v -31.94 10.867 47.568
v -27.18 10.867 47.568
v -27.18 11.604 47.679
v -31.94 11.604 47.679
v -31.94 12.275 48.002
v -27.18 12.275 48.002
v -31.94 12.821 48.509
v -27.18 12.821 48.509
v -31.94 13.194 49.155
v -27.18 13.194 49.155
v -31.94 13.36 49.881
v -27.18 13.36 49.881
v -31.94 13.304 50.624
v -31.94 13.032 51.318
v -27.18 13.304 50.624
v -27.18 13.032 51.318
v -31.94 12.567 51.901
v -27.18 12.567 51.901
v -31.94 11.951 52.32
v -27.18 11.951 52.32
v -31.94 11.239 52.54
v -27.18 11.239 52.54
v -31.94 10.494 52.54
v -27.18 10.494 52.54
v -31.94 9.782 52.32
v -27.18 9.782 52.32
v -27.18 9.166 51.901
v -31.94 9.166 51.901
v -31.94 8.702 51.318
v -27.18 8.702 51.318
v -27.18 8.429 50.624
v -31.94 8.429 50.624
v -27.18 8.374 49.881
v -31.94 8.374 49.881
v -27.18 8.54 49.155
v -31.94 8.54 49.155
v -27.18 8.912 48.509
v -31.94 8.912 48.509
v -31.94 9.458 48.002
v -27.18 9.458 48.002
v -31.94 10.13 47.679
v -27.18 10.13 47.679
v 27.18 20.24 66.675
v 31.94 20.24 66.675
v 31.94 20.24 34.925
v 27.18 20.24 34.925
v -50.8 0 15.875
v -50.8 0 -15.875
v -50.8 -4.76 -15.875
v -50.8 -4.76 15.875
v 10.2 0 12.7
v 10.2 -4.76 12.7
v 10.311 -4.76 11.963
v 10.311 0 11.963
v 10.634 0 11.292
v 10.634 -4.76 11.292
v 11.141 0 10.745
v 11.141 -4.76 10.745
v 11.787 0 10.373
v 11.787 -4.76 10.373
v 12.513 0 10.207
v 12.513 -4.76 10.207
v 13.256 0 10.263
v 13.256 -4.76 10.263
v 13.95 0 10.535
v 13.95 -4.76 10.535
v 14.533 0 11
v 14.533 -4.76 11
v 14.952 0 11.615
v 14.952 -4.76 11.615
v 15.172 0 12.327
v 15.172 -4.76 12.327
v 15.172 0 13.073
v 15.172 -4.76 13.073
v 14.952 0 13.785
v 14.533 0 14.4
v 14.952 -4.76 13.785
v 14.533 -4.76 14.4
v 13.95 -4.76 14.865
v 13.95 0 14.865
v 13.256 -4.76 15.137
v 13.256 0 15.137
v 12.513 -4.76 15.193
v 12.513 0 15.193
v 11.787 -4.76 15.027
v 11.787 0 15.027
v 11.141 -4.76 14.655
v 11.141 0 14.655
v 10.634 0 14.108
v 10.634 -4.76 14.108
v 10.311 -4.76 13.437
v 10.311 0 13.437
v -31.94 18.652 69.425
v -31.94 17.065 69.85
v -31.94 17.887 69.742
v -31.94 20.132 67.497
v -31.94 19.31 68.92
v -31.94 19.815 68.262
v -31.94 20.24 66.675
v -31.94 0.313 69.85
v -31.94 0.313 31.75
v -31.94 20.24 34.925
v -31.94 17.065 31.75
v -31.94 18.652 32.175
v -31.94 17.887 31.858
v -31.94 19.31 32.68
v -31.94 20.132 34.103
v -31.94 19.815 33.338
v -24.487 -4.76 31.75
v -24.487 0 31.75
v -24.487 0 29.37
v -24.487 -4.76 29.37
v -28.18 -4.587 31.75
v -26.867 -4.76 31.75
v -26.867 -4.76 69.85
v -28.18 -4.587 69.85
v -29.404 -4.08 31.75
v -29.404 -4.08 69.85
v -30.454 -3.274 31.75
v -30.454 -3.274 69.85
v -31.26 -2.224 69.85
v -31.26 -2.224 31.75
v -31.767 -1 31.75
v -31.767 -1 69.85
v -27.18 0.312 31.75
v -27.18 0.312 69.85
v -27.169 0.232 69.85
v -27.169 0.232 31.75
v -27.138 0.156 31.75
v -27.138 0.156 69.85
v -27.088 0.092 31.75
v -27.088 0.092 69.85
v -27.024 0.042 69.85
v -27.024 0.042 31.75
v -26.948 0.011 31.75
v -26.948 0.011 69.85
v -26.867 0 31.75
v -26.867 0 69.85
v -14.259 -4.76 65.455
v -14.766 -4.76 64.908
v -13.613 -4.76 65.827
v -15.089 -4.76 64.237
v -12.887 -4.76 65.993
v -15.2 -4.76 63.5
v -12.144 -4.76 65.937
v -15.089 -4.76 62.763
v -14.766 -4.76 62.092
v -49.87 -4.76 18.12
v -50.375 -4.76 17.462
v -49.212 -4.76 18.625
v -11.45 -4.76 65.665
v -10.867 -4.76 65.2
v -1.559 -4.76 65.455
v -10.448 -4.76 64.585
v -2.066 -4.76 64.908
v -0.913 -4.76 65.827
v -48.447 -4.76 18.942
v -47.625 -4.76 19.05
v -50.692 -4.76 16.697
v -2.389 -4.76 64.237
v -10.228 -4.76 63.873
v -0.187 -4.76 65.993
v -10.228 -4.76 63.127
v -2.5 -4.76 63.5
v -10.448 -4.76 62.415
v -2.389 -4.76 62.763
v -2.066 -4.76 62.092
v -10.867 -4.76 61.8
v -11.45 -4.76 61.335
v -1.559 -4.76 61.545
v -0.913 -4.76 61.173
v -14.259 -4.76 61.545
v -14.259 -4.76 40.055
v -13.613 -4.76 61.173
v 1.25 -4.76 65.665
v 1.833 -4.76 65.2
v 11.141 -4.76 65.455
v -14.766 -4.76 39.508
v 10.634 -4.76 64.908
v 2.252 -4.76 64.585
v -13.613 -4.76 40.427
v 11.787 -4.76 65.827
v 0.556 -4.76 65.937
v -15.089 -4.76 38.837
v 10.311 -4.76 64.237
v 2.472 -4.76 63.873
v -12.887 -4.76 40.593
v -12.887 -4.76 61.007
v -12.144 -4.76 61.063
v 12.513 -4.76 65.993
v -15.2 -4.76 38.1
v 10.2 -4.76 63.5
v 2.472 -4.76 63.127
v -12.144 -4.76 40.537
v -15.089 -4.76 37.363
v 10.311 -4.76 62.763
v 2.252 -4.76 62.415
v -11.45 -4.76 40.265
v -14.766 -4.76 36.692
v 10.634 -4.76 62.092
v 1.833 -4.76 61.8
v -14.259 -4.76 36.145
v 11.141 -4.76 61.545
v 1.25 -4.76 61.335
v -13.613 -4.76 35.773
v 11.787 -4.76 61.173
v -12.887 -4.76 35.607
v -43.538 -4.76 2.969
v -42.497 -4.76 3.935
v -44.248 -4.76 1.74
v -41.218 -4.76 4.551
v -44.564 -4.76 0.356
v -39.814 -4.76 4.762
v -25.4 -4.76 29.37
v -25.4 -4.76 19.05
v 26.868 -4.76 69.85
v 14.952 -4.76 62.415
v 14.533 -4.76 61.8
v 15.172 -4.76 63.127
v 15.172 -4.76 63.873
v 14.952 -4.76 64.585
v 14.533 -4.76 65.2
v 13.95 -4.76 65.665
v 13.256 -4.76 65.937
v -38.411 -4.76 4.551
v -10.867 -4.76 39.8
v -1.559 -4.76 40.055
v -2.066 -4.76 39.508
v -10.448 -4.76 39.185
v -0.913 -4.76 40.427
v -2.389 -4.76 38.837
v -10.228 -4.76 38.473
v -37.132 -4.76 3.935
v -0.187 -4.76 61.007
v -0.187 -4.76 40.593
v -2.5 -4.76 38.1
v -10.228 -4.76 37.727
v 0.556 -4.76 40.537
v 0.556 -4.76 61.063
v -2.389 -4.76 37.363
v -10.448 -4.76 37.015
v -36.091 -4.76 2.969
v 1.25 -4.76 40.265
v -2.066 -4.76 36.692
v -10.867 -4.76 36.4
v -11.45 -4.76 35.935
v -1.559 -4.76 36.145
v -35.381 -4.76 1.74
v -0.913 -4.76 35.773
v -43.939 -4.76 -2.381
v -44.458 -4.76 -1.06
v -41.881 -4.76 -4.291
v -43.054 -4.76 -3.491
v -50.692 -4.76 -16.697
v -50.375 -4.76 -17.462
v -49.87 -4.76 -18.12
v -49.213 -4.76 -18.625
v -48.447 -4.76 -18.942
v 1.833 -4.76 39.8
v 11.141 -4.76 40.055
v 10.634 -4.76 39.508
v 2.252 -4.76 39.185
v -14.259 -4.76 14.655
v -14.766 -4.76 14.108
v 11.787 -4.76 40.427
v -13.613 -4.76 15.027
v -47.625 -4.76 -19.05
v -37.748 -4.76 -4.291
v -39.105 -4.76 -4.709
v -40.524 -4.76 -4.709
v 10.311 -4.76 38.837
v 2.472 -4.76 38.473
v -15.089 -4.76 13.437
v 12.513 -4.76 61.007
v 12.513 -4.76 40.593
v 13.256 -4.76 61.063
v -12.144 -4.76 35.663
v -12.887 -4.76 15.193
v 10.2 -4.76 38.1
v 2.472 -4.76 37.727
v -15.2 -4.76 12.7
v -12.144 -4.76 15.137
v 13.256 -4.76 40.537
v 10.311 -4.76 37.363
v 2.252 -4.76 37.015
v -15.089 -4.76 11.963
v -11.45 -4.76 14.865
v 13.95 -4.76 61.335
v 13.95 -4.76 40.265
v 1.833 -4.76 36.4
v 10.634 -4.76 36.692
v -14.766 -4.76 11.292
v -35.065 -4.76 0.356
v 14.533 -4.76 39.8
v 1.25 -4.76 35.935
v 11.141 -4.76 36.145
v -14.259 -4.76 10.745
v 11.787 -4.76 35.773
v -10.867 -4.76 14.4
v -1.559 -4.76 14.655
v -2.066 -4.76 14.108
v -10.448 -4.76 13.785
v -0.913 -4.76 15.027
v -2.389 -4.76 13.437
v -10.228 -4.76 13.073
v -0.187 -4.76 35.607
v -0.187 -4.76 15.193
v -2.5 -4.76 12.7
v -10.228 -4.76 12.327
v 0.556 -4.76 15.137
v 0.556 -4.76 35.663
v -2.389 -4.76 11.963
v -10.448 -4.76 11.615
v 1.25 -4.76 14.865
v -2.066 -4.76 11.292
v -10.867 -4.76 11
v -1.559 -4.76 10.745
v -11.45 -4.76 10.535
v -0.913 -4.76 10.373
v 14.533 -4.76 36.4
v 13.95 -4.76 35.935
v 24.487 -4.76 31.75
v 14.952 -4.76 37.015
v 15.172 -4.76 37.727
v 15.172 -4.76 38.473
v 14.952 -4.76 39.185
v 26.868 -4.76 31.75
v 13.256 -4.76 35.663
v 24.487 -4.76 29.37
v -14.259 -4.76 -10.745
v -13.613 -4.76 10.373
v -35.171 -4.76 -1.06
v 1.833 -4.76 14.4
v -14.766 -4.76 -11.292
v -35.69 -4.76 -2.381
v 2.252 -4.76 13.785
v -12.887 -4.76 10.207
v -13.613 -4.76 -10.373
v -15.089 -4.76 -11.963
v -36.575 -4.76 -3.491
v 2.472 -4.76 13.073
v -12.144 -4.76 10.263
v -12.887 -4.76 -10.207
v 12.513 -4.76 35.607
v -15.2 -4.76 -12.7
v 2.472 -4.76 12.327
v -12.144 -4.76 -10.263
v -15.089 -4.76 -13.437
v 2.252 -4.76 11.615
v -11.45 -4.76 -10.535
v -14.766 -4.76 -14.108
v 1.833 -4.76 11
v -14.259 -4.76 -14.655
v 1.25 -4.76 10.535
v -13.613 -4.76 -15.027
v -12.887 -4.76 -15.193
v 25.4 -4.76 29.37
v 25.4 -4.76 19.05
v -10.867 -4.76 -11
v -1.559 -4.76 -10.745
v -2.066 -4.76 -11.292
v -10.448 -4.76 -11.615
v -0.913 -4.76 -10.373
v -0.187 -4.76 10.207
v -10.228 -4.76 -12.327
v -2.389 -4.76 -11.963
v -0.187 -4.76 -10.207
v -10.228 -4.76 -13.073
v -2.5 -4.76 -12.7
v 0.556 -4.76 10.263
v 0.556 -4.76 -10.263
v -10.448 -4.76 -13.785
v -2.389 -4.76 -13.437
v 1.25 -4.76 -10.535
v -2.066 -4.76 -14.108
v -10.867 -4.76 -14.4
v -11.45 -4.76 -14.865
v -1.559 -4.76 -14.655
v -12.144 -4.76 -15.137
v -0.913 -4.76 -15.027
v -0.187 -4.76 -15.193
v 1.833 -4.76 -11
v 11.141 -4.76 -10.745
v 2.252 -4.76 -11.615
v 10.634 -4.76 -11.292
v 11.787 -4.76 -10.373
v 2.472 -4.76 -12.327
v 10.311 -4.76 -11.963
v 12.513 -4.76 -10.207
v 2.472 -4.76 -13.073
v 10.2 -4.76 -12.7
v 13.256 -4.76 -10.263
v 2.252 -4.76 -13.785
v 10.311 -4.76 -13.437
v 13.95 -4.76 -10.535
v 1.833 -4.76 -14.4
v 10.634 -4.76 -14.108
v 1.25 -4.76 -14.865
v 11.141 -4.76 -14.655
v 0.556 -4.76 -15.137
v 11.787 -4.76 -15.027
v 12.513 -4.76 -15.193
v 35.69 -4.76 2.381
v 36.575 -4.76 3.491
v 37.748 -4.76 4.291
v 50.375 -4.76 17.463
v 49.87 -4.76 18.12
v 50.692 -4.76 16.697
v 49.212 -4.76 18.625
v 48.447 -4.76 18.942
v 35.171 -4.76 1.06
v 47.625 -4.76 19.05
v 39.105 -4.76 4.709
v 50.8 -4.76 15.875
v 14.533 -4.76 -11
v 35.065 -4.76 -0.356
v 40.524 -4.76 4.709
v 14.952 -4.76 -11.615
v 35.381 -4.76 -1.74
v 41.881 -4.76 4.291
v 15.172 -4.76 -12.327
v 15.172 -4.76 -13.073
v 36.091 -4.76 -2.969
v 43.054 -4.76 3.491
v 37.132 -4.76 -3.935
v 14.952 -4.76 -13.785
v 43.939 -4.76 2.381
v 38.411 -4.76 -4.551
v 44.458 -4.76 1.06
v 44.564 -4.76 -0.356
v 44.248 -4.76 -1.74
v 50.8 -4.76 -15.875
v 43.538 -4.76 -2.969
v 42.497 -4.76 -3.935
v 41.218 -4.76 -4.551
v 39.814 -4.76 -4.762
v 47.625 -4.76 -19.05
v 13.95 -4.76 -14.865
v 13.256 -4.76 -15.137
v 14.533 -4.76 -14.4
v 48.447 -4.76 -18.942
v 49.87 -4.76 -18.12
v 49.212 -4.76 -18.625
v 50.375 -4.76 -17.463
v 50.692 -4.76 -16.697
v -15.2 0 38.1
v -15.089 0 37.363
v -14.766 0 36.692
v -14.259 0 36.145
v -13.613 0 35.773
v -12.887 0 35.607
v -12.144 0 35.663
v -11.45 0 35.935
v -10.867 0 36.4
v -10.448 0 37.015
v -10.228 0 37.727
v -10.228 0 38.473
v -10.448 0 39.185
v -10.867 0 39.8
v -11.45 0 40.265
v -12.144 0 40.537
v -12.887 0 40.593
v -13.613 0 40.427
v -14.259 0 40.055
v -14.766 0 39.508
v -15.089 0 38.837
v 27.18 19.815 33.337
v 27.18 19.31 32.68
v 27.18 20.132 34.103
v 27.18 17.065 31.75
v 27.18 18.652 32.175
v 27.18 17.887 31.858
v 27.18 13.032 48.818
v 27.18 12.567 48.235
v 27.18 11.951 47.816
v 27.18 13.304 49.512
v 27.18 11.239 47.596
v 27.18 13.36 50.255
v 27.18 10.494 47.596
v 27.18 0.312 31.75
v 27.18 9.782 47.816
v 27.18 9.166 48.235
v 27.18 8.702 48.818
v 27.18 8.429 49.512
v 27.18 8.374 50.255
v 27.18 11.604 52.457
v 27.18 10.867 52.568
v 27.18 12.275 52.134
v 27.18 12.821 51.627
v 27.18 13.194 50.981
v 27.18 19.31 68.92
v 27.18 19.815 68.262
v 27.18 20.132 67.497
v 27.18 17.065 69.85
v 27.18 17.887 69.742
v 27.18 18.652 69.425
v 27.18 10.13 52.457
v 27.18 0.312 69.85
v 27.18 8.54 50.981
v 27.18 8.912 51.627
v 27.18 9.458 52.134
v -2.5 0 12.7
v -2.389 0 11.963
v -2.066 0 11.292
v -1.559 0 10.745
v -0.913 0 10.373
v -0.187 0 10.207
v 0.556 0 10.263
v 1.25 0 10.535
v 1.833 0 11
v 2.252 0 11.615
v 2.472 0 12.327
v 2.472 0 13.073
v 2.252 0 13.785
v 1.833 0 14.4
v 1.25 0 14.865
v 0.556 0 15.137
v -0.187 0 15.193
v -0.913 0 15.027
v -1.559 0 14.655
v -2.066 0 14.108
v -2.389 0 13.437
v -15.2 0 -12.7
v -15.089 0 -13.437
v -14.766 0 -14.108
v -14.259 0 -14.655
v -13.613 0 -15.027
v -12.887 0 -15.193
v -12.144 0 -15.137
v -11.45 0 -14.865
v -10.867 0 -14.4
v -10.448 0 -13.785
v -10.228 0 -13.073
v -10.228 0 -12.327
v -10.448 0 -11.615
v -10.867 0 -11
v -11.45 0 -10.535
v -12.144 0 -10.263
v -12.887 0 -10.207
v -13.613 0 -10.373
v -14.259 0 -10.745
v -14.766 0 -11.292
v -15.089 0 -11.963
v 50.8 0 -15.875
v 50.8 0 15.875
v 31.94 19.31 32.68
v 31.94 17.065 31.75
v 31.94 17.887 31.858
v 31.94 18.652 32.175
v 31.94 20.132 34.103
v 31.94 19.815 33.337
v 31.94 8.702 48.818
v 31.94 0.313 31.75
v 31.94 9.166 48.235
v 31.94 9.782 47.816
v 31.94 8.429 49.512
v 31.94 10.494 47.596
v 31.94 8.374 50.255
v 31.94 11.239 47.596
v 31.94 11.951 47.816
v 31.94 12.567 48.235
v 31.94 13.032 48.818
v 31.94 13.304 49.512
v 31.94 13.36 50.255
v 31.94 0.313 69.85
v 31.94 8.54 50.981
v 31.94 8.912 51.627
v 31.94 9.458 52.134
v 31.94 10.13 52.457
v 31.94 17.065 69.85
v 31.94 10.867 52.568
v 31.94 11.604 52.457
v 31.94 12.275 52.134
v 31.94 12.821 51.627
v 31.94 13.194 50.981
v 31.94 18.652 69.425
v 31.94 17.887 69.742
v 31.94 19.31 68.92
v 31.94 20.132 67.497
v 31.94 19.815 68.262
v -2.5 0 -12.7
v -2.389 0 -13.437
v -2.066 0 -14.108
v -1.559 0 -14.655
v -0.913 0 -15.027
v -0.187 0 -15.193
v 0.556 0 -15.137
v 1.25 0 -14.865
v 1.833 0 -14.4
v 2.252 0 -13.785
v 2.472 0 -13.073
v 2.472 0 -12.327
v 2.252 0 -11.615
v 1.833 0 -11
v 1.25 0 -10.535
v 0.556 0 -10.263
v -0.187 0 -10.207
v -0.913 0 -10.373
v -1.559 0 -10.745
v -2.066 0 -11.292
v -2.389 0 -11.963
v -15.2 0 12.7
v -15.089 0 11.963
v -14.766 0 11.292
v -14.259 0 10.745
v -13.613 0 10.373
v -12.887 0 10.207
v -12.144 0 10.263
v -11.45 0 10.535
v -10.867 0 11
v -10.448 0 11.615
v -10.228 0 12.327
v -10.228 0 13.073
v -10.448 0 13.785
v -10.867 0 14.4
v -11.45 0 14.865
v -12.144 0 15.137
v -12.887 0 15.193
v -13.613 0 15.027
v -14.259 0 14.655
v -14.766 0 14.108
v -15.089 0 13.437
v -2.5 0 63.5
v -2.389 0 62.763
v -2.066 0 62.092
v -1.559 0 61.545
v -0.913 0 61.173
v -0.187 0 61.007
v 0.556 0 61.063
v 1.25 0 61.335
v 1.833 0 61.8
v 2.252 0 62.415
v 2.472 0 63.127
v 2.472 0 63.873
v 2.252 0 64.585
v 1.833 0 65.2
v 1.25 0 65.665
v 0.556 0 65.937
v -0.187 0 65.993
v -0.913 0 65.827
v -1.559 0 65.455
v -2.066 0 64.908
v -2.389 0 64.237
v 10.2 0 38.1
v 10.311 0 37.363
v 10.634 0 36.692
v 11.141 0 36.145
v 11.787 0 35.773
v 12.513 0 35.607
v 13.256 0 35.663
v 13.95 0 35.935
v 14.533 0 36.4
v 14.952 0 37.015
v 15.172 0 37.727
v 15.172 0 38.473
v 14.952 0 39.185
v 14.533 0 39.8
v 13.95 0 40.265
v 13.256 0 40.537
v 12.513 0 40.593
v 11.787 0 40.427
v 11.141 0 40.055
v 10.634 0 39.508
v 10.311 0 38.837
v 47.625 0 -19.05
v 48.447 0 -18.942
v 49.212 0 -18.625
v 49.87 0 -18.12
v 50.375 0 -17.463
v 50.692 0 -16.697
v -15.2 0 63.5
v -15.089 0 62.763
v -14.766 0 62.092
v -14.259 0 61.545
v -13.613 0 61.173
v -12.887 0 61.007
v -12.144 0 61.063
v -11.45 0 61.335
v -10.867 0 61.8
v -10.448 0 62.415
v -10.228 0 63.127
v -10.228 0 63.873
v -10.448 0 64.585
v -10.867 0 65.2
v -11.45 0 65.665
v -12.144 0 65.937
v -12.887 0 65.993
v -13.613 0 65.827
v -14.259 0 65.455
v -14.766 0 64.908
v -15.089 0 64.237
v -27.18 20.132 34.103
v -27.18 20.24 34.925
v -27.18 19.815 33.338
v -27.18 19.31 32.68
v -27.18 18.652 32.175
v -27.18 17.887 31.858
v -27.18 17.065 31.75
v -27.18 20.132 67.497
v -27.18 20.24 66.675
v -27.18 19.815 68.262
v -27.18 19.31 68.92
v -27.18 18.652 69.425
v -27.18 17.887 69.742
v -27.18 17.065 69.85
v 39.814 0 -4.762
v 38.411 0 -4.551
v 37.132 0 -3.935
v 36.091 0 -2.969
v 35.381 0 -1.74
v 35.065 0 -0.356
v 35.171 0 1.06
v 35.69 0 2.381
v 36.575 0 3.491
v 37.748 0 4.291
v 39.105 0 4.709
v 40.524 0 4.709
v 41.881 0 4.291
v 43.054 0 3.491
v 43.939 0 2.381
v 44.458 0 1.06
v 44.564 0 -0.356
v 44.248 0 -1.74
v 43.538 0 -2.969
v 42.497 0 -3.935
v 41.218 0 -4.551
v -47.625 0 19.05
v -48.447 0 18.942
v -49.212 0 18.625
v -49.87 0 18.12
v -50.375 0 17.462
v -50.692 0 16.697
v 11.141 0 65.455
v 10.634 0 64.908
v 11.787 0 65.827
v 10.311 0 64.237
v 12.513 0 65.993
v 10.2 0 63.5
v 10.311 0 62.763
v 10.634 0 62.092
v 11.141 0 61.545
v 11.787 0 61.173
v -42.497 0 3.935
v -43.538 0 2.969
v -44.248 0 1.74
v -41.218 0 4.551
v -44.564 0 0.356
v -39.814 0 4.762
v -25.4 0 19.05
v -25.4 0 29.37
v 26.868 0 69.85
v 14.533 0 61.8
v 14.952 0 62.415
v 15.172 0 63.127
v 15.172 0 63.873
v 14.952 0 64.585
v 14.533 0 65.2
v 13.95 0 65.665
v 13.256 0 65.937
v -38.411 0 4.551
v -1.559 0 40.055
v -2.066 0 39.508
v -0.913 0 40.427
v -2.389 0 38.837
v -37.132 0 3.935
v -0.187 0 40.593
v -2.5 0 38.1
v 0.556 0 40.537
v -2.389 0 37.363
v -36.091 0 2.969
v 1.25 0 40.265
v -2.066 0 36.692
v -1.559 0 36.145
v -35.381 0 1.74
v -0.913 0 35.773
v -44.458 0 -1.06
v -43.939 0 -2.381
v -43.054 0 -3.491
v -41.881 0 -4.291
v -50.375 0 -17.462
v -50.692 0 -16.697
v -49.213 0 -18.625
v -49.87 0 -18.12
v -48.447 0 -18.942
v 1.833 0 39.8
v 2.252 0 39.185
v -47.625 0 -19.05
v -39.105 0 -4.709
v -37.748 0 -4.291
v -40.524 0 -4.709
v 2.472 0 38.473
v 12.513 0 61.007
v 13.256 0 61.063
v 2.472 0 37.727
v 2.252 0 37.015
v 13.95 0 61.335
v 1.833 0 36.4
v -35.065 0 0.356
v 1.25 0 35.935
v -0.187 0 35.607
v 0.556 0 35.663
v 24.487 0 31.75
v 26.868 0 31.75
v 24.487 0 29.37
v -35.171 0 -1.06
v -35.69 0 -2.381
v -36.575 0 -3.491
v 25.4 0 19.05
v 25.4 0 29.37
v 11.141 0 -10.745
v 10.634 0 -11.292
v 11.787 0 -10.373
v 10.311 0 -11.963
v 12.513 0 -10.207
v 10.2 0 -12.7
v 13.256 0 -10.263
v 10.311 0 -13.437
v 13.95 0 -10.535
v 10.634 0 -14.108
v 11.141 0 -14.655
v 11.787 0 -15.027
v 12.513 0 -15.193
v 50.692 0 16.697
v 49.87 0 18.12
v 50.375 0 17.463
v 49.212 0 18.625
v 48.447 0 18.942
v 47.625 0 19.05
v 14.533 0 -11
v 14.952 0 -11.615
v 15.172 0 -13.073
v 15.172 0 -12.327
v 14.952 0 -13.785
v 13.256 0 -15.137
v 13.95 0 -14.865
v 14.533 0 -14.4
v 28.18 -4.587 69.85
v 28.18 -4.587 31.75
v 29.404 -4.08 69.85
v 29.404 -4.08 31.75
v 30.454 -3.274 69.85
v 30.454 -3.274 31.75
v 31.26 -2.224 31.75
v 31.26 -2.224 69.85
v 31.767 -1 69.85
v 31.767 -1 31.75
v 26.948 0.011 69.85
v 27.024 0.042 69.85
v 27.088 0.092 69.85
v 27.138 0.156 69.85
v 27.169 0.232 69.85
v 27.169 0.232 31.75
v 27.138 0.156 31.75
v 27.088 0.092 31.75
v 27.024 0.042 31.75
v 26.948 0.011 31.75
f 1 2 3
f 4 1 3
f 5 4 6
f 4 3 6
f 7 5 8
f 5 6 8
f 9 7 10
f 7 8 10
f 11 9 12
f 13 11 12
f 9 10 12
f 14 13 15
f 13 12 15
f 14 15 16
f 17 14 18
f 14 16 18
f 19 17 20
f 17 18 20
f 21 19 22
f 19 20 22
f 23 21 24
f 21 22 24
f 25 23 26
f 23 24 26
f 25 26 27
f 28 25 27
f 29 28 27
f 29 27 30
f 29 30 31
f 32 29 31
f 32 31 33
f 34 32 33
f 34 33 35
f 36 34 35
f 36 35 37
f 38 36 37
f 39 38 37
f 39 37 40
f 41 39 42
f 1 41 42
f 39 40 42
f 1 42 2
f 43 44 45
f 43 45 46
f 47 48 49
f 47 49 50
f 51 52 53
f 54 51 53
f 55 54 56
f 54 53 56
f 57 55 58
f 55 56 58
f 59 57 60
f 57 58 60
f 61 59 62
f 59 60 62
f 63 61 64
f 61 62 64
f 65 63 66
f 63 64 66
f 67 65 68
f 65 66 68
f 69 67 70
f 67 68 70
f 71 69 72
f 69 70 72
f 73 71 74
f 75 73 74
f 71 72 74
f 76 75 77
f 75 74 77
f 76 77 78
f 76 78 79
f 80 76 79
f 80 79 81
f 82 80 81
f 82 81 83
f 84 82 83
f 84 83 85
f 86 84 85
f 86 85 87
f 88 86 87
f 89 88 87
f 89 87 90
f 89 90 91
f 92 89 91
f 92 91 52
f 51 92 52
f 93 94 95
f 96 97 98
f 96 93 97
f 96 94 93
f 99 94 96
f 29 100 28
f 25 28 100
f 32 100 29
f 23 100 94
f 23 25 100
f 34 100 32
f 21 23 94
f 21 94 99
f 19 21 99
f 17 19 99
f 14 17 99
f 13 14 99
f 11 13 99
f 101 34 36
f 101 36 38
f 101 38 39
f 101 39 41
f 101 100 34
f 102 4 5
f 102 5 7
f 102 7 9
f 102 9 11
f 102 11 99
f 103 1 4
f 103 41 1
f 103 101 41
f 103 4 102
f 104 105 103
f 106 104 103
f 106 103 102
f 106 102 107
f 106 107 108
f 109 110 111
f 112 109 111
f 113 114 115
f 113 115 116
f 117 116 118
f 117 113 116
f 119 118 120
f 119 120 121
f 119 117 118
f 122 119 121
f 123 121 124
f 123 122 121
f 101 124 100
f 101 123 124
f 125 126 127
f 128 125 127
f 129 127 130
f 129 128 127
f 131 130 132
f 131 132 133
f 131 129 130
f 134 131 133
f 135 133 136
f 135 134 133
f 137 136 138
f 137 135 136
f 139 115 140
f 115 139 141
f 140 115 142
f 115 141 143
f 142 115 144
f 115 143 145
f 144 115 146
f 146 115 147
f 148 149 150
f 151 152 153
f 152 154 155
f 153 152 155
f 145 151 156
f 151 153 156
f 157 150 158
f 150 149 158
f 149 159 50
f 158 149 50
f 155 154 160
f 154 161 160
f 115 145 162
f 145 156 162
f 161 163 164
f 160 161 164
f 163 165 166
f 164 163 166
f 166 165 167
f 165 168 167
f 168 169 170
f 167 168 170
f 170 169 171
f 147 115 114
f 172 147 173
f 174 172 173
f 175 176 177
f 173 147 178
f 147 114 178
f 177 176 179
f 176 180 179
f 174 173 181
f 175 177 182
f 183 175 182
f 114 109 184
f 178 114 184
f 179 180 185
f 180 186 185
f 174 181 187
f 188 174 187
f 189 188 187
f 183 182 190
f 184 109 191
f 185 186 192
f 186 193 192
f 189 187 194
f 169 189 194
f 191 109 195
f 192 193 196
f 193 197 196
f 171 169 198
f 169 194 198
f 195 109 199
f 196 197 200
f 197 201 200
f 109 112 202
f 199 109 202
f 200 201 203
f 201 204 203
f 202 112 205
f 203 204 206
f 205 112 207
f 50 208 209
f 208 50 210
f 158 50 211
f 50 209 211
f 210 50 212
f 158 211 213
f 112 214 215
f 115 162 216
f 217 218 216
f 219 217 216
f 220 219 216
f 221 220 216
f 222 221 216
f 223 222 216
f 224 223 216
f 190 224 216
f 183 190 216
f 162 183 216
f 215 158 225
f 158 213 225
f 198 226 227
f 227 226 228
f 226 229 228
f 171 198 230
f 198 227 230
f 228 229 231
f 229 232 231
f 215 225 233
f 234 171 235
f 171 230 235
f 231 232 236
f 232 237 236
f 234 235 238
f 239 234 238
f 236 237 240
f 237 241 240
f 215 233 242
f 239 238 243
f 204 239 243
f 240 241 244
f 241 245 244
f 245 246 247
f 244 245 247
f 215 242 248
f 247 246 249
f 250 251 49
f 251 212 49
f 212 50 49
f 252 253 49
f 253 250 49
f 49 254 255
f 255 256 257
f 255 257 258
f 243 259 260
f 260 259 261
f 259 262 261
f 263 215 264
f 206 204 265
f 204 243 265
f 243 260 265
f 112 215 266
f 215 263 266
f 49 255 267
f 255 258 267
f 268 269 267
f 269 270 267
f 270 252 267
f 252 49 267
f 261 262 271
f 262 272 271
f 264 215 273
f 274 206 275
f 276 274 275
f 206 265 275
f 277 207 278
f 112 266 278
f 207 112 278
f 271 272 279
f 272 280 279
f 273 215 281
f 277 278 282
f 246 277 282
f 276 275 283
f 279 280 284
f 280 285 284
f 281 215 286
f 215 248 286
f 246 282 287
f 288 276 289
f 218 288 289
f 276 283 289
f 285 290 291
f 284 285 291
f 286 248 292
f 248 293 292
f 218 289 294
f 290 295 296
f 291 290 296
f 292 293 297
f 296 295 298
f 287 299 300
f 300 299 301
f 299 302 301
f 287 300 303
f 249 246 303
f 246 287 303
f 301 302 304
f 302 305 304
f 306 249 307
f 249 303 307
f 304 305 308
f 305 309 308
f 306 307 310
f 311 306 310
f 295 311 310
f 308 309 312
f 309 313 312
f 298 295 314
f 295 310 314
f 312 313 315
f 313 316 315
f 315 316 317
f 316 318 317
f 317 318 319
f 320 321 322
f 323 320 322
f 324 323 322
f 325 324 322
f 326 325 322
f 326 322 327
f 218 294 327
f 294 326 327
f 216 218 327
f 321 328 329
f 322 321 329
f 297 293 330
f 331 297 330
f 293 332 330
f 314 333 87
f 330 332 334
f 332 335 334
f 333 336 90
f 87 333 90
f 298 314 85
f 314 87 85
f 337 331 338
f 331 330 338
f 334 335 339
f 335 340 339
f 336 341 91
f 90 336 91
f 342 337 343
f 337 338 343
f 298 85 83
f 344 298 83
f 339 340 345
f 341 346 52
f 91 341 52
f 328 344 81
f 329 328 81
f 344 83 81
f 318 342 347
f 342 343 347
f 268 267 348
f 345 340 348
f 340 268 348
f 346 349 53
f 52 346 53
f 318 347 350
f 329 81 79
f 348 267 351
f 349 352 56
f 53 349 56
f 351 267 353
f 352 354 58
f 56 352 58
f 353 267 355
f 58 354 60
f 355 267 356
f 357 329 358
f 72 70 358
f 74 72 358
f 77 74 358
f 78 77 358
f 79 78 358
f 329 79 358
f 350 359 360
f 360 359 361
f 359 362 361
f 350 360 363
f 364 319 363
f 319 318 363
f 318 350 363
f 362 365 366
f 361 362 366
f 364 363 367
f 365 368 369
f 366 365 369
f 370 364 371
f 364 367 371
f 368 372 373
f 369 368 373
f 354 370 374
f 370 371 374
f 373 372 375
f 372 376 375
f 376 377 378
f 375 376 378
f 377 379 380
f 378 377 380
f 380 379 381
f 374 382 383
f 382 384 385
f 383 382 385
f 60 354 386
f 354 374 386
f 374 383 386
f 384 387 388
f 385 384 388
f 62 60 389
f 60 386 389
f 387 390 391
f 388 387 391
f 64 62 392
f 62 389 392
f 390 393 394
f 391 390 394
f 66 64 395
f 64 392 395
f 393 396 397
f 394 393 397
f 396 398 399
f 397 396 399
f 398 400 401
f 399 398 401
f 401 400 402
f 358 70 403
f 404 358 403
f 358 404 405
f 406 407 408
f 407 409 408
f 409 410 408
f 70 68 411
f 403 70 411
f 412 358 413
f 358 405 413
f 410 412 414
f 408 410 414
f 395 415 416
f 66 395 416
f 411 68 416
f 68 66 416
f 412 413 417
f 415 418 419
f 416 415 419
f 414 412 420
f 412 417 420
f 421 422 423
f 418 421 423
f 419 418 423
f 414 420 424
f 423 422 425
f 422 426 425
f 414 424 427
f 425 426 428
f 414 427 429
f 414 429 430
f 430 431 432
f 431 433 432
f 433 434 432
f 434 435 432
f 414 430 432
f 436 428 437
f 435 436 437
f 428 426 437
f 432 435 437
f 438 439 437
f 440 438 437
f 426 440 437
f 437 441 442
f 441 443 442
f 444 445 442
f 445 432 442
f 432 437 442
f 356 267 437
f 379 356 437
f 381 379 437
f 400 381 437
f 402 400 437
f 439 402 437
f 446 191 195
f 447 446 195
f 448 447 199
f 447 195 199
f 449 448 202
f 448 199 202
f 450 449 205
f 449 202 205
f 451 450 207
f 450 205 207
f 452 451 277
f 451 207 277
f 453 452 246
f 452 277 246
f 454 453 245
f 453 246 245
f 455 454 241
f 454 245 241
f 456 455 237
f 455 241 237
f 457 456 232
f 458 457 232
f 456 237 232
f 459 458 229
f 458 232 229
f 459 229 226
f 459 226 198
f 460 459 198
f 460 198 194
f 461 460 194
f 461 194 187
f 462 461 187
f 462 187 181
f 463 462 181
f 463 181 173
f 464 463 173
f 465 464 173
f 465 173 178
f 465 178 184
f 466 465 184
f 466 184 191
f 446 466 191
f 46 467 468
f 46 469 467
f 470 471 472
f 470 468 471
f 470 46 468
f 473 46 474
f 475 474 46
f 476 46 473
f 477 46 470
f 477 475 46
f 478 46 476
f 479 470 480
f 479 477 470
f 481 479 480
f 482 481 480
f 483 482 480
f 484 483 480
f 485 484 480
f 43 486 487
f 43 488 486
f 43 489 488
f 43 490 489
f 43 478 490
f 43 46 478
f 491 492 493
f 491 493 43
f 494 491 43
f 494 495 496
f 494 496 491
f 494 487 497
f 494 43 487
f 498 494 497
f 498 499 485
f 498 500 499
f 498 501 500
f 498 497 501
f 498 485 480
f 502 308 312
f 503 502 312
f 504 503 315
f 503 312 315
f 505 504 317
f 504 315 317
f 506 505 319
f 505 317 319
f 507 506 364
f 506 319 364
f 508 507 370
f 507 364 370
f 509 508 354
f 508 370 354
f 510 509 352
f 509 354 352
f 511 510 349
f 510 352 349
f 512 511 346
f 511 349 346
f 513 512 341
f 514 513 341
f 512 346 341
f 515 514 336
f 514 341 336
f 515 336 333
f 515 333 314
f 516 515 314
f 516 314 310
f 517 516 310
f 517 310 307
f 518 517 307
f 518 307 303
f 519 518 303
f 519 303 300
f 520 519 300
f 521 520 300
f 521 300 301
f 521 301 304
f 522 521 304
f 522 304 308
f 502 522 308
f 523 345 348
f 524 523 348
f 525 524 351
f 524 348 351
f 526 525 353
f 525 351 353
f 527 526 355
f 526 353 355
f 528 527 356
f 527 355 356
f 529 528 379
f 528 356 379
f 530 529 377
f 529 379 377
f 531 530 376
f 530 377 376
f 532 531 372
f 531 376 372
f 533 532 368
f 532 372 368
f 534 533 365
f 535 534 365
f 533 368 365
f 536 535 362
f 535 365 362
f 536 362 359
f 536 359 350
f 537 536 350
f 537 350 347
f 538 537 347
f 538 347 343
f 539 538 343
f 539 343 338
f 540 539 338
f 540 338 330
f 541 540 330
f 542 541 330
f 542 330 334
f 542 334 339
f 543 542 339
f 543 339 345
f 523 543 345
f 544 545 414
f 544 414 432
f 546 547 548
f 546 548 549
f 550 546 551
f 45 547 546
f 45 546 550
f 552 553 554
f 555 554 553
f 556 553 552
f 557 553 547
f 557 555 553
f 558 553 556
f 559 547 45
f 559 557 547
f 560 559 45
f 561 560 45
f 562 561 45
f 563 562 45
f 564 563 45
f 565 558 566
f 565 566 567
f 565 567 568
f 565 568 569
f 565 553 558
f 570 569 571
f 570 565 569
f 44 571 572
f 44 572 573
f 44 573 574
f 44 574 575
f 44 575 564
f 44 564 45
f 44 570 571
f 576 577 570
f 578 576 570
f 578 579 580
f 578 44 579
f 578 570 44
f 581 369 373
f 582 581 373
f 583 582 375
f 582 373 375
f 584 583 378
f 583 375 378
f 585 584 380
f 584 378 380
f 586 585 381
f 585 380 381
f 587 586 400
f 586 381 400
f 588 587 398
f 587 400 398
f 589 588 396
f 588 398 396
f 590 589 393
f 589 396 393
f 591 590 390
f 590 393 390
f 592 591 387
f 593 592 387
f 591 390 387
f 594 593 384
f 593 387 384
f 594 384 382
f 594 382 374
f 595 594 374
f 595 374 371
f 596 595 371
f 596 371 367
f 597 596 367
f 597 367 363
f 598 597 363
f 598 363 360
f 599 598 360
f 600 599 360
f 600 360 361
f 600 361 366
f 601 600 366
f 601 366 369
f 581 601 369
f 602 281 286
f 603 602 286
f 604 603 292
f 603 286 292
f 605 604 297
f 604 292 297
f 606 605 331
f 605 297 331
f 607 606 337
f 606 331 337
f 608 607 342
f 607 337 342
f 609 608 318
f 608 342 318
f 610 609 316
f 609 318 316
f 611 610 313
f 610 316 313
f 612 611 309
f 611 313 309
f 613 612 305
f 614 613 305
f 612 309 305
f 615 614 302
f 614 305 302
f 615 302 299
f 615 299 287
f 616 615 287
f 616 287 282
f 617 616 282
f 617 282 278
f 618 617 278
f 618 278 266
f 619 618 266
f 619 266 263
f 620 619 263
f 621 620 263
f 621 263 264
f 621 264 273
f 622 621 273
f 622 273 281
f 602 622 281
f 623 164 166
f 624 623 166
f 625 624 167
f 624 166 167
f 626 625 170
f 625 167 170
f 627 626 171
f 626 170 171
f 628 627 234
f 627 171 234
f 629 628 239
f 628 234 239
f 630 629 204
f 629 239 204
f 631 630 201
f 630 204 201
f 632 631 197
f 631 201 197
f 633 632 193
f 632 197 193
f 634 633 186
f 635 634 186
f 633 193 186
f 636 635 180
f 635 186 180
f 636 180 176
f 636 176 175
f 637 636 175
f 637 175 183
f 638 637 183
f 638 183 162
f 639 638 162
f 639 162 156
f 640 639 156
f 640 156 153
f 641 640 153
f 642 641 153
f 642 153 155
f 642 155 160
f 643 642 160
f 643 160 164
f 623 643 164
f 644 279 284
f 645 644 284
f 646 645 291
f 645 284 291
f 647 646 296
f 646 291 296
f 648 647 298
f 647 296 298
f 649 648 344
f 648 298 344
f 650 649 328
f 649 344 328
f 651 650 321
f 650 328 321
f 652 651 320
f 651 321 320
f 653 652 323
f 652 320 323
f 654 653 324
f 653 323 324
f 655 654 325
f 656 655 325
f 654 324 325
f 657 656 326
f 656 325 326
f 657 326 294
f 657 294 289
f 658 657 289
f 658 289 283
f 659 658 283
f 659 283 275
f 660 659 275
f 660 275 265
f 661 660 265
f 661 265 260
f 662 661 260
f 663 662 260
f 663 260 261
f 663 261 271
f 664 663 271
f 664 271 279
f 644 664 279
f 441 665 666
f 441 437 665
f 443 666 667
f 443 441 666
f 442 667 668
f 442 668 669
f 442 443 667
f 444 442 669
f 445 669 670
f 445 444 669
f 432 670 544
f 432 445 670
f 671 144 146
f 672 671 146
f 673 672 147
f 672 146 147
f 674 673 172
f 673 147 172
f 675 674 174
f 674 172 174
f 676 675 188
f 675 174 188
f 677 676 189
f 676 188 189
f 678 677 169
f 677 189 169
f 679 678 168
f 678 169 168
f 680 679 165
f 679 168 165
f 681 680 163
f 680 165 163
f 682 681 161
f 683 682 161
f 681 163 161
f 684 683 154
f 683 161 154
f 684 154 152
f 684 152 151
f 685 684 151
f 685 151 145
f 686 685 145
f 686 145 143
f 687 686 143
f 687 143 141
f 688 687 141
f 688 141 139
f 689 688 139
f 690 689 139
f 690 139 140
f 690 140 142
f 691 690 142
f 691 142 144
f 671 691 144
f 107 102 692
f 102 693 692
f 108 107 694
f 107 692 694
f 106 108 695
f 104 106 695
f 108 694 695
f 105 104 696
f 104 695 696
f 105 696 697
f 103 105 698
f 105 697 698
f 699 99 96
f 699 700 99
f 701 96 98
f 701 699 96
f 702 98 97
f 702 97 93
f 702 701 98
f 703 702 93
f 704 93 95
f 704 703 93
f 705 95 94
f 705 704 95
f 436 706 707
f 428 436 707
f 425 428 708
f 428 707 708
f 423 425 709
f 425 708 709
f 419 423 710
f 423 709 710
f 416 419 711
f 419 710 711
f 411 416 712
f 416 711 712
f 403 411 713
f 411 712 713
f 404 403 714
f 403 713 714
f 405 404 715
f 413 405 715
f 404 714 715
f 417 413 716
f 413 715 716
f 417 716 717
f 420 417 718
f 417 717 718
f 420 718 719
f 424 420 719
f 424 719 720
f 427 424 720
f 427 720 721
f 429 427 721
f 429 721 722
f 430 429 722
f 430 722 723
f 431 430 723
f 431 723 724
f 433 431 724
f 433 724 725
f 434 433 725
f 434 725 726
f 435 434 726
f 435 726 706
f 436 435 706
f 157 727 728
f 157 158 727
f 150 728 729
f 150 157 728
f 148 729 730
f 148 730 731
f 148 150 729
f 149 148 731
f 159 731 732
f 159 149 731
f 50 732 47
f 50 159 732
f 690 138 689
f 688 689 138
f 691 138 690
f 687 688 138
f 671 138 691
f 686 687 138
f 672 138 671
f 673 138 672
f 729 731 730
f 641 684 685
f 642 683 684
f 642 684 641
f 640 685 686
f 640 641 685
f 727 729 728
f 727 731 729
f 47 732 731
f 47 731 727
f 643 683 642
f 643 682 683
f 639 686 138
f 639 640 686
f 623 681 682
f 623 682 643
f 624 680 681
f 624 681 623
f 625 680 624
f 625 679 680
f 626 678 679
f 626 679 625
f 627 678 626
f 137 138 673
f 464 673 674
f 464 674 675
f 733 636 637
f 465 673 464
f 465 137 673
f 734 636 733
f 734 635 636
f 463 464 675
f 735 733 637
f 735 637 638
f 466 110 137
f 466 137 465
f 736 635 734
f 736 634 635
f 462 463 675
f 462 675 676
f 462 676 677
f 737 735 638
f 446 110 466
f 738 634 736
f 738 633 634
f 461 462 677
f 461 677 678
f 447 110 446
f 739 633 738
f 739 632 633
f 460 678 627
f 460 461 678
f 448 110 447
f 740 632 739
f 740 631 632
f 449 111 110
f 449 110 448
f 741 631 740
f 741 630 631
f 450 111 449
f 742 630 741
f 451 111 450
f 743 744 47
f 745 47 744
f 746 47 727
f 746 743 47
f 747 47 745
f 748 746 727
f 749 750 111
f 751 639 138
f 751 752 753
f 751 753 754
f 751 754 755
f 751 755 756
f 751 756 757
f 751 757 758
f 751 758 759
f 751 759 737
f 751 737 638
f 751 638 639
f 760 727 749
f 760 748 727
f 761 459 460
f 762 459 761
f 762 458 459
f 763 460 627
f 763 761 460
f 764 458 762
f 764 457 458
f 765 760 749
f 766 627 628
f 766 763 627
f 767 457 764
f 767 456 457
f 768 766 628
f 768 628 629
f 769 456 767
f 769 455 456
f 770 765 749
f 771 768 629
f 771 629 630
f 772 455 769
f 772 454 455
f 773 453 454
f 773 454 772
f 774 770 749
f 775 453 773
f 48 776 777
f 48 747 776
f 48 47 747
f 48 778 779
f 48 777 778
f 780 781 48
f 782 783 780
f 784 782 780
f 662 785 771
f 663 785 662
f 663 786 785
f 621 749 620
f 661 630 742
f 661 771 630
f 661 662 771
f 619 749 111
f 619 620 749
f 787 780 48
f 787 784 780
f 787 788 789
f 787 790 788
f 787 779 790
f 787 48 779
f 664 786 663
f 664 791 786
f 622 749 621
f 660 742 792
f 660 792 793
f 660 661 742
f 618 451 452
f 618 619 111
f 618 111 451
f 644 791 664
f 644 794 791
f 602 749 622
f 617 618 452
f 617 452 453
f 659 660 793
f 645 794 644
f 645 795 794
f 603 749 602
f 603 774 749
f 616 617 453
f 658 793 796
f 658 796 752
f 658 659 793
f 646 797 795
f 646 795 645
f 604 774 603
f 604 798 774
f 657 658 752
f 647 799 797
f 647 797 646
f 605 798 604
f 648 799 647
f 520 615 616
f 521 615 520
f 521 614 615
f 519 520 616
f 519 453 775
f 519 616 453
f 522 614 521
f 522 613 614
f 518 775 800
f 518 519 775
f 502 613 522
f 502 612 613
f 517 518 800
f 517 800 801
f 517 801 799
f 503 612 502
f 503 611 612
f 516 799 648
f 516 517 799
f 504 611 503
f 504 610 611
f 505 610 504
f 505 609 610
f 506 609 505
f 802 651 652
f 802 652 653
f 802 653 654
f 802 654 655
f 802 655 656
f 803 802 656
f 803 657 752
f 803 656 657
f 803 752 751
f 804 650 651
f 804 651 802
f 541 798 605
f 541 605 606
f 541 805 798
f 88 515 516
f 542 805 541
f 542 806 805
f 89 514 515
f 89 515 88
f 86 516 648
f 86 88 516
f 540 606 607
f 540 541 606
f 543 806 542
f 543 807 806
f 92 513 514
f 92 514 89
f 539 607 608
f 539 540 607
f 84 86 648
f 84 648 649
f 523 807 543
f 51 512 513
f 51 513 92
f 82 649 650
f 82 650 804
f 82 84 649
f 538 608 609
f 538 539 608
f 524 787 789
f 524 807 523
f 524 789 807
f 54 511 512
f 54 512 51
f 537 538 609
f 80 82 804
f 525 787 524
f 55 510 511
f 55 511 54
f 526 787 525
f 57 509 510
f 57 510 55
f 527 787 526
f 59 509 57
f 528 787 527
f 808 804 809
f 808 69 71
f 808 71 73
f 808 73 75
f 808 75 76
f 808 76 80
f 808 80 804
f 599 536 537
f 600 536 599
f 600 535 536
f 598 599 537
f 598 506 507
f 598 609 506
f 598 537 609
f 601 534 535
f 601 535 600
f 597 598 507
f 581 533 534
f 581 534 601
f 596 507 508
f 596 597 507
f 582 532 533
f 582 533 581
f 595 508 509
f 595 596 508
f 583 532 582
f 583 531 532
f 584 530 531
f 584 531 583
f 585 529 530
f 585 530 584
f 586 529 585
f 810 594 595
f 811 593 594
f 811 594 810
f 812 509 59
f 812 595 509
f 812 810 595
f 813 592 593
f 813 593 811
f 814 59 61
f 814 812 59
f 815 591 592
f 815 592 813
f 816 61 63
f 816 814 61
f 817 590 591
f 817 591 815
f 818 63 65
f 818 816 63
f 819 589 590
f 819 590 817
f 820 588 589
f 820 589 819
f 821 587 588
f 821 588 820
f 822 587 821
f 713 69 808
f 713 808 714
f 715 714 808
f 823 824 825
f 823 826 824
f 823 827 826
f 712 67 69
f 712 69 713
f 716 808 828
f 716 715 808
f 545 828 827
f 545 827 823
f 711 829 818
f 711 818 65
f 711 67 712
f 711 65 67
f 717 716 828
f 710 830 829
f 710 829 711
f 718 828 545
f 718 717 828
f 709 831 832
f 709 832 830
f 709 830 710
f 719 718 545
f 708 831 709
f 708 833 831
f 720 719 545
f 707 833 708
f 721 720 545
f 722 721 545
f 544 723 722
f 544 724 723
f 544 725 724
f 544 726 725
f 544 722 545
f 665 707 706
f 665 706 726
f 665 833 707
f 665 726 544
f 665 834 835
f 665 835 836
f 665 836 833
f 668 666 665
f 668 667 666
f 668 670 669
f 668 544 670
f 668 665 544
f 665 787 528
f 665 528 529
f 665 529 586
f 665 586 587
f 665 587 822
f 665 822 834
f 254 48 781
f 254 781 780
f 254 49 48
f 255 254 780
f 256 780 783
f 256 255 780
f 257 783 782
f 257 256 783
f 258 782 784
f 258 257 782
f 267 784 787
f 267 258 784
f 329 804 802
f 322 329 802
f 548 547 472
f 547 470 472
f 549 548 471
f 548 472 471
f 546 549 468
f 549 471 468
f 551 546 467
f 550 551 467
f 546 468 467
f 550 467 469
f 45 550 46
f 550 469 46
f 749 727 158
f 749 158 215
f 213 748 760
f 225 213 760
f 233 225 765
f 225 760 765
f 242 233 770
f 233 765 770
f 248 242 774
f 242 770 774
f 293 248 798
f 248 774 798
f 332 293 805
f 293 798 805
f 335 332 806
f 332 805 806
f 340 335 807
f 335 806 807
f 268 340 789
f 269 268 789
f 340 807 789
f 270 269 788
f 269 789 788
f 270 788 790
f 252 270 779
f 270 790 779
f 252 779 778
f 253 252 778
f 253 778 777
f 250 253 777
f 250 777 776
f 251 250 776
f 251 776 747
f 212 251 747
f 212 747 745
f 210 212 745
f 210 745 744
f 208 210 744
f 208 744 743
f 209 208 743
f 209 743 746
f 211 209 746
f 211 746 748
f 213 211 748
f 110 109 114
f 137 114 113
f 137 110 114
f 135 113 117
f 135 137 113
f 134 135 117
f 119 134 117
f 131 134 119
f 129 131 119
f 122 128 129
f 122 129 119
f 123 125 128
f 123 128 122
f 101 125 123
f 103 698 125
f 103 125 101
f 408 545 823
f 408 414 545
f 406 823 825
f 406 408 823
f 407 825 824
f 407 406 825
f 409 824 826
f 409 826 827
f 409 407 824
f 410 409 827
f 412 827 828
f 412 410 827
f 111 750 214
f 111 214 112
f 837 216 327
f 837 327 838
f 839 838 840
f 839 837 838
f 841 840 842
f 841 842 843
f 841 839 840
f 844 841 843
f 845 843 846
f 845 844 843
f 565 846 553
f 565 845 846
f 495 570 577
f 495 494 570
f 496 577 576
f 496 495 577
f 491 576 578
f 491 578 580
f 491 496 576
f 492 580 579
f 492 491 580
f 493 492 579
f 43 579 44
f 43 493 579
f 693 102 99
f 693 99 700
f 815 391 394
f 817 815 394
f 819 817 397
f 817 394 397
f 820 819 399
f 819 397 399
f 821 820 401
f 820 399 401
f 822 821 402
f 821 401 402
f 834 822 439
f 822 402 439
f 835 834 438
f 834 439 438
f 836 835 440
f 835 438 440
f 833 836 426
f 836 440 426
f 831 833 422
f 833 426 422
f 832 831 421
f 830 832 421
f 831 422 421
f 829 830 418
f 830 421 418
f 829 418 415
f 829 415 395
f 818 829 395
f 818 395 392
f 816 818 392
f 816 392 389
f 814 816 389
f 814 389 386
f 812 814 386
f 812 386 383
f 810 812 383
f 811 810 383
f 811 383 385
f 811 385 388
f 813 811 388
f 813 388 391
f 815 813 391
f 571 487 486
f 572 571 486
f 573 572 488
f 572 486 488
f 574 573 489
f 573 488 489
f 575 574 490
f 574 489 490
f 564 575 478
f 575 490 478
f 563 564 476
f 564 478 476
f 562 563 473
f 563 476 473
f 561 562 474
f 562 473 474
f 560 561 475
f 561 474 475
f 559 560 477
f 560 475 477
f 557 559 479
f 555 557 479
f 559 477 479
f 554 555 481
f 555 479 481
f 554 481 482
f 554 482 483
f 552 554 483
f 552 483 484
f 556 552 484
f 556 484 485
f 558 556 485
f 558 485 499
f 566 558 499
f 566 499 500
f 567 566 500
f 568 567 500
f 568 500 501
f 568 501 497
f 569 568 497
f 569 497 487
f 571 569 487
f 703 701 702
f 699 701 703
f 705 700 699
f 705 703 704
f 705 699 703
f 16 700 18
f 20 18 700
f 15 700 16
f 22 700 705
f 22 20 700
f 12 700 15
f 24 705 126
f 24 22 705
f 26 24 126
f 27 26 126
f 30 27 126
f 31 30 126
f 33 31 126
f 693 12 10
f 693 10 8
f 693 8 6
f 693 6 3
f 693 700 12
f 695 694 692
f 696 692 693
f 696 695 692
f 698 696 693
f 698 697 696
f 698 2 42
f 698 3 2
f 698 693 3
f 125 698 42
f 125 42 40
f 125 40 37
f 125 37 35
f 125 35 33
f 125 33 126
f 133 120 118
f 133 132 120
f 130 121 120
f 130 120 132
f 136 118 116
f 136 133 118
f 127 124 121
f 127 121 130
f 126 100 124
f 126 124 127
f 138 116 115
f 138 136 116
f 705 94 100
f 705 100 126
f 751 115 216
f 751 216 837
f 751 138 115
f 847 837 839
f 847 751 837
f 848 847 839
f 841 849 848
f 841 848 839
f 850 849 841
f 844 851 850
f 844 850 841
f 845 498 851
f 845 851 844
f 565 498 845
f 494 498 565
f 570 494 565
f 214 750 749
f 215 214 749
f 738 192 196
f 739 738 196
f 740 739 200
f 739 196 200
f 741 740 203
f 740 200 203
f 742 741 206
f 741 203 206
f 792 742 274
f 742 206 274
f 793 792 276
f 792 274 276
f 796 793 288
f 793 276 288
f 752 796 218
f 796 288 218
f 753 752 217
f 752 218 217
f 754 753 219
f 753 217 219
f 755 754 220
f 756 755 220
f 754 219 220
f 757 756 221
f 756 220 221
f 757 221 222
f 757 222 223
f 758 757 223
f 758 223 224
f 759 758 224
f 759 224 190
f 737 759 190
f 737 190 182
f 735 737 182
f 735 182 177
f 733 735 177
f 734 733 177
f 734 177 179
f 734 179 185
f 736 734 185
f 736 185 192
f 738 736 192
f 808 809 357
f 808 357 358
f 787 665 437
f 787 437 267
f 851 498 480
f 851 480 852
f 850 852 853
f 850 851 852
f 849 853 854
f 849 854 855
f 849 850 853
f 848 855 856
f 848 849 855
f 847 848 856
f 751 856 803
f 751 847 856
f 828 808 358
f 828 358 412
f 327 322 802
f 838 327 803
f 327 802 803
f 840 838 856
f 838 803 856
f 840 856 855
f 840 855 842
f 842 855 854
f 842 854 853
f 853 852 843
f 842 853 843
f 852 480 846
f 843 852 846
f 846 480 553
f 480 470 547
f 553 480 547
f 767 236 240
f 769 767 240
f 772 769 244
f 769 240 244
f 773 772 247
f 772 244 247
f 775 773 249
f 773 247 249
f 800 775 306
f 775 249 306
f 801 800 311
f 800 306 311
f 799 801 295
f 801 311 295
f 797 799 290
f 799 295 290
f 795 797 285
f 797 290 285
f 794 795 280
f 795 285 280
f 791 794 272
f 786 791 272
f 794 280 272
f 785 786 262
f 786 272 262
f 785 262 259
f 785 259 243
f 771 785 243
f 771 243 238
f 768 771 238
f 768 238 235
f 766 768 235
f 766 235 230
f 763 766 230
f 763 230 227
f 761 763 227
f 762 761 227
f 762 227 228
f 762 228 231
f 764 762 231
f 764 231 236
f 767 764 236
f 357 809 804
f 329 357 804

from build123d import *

# Parameters (mm, degrees)
T_LE_DE_BASE_PLI_E1_DEPTH                = 4.76
T_LE_PLI_E_SUR_AR_TE1_STRIP_W            = 19.665
T_LE_PLI_E_SUR_AR_TE1_STRIP_H            = 4.76
T_LE_PLI_E_SUR_AR_TE1_STRIP_CUT_DEPTH    = 38.1
T_LE_PLI_E_SUR_AR_TE1_RELIEF_W           = 22.045
T_LE_PLI_E_SUR_AR_TE1_RELIEF_H           = 2.38
T_LE_PLI_E_SUR_AR_TE1_RELIEF_CUT_DEPTH   = 4.76
T_LE_PLI_E_SUR_AR_TE1_STRIP_2_W          = 19.665
T_LE_PLI_E_SUR_AR_TE1_STRIP_2_H          = 4.76
T_LE_PLI_E_SUR_AR_TE1_STRIP_CUT_2_DEPTH  = 38.1
T_LE_PLI_E_SUR_AR_TE1_RELIEF_2_W         = 22.045
T_LE_PLI_E_SUR_AR_TE1_RELIEF_2_H         = 2.38
T_LE_PLI_E_SUR_AR_TE1_RELIEF_CUT_2_DEPTH = 4.76
T_LE_PLI_E_SUR_AR_TE1_DEPTH              = 38.1
T_LE_PLI_E_SUR_AR_TE1_BEND_DEPTH         = 38.1
ENL_V_MAT_EXTRU_1_REACH                  = 90.709
ESQUISSE12_W                             = 6.54
ESQUISSE12_H                             = 10.32
CONG_1_R                                 = 3.175
ESQUISSE13_R                             = 4.7625
ENL_V_MAT_EXTRU_3_DEPTH                  = 89.709188363
DIAM_TRE_DU_PER_AGE_5_0_5_1_D            = 5
R_P_TITION_LIN_AIRE1_COUNT               = 4
R_P_TITION_LIN_AIRE1_PITCH               = 25.4
DIAM_TRE_DU_PER_AGE_5_0_5_2_D            = 5
DIAM_TRE_DU_PER_AGE_5_0_5_2_DEPTH        = 4.76
DIAM_TRE_DU_PER_AGE_5_0_5_3_D            = 5


# Sheet-metal steps are written as plain solids
with BuildPart() as part:
    # Esquisse1 → Tôle de base pliée1 (new body)
    with BuildSketch(Plane(origin=(0, 0, 0), x_dir=(1, 0, 0), z_dir=(0, 1, 0))):
        Polygon((-31.94, -19.05), (-31.94, -69.85), (31.94, -69.85), (31.94, -19.05), (50.8, -19.05), (50.8, 19.05), (-50.8, 19.05), (-50.8, -19.05), align=None)
    extrude(amount=-T_LE_DE_BASE_PLI_E1_DEPTH)

    # Tôle pliée sur arête1 strip (across the edge) → Tôle pliée sur arête1 strip cut (cut)
    with BuildSketch(Plane(origin=(-31.94, 0, 31.75), x_dir=(1, 0, 0), z_dir=(0, 0, 1))):
        with Locations((-4.76, -2.38)):
            Rectangle(T_LE_PLI_E_SUR_AR_TE1_STRIP_W, T_LE_PLI_E_SUR_AR_TE1_STRIP_H)
    extrude(amount=T_LE_PLI_E_SUR_AR_TE1_STRIP_CUT_DEPTH, mode=Mode.SUBTRACT)

    # Tôle pliée sur arête1 relief (on the sheet) → Tôle pliée sur arête1 relief cut (cut)
    with BuildSketch(Plane(origin=(-26.8675, 0, 31.75), x_dir=(1, 0, 0), z_dir=(0, 1, 0))):
        with Locations((-8.6425, 1.19)):
            Rectangle(T_LE_PLI_E_SUR_AR_TE1_RELIEF_W, T_LE_PLI_E_SUR_AR_TE1_RELIEF_H)
    extrude(amount=-T_LE_PLI_E_SUR_AR_TE1_RELIEF_CUT_DEPTH, mode=Mode.SUBTRACT)

    # Tôle pliée sur arête1 strip 2 (across the edge) → Tôle pliée sur arête1 strip cut 2 (cut)
    with BuildSketch(Plane(origin=(31.94, 0, 69.85), x_dir=(-1, 0, 0), z_dir=(0, 0, -1))):
        with Locations((-4.76, -2.38)):
            Rectangle(T_LE_PLI_E_SUR_AR_TE1_STRIP_2_W, T_LE_PLI_E_SUR_AR_TE1_STRIP_2_H)
    extrude(amount=T_LE_PLI_E_SUR_AR_TE1_STRIP_CUT_2_DEPTH, mode=Mode.SUBTRACT)

    # Tôle pliée sur arête1 relief 2 (on the sheet) → Tôle pliée sur arête1 relief cut 2 (cut)
    with BuildSketch(Plane(origin=(26.8675, 0, 69.85), x_dir=(-1, 0, 0), z_dir=(0, 1, 0))):
        with Locations((-8.6425, -39.29)):
            Rectangle(T_LE_PLI_E_SUR_AR_TE1_RELIEF_2_W, T_LE_PLI_E_SUR_AR_TE1_RELIEF_2_H)
    extrude(amount=-T_LE_PLI_E_SUR_AR_TE1_RELIEF_CUT_2_DEPTH, mode=Mode.SUBTRACT)

    # Tôle pliée sur arête1 section (across the edge) → Tôle pliée sur arête1 (add)
    with BuildSketch(Plane(origin=(-31.94, 0, 31.75), x_dir=(1, 0, 0), z_dir=(0, 0, 1))):
        with BuildLine():
            Line((0, 0.3125), (0, 20.24))
            Line((0, 20.24), (4.76, 20.24))
            Line((4.76, 20.24), (4.76, 0.3125))
            ThreePointArc((4.76, 0.3125), (4.851529131, 0.091529131), (5.0725, 0))
            Line((5.0725, 0), (5.0725, -4.76))
            ThreePointArc((5.0725, -4.76), (1.485700852, -3.274299148), (0, 0.3125))
        make_face()
    extrude(amount=T_LE_PLI_E_SUR_AR_TE1_DEPTH)

    # Tôle pliée sur arête1 section 2 (across the edge) → Tôle pliée sur arête1 bend (add)
    with BuildSketch(Plane(origin=(31.94, 0, 69.85), x_dir=(-1, 0, 0), z_dir=(0, 0, -1))):
        with BuildLine():
            Line((0, 0.3125), (0, 20.24))
            Line((0, 20.24), (4.76, 20.24))
            Line((4.76, 20.24), (4.76, 0.3125))
            ThreePointArc((4.76, 0.3125), (4.851529131, 0.091529131), (5.0725, 0))
            Line((5.0725, 0), (5.0725, -4.76))
            ThreePointArc((5.0725, -4.76), (1.485700852, -3.274299148), (0, 0.3125))
        make_face()
    extrude(amount=T_LE_PLI_E_SUR_AR_TE1_BEND_DEPTH)

    # Esquisse12 → Enlèv. mat.-Extru.1 (cut, up to next)
    with BuildSketch(Plane(origin=(0, 0, 0), x_dir=(1, 0, 0), z_dir=(0, 1, 0)), mode=Mode.PRIVATE) as enl_v_mat_extru_1_sk1:
        with Locations((-28.67, -24.21)):
            Rectangle(ESQUISSE12_W, ESQUISSE12_H)
    enl_v_mat_extru_1_tool1 = extrude(enl_v_mat_extru_1_sk1.sketch, amount=-ENL_V_MAT_EXTRU_1_REACH, mode=Mode.PRIVATE) & part.part
    # Esquisse12 → Enlèv. mat.-Extru.1 (cut, up to next)
    with BuildSketch(Plane(origin=(0, 0, 0), x_dir=(1, 0, 0), z_dir=(0, 1, 0)), mode=Mode.PRIVATE) as enl_v_mat_extru_1_sk2:
        with Locations((28.67, -24.21)):
            Rectangle(ESQUISSE12_W, ESQUISSE12_H)
    enl_v_mat_extru_1_tool2 = extrude(enl_v_mat_extru_1_sk2.sketch, amount=-ENL_V_MAT_EXTRU_1_REACH, mode=Mode.PRIVATE) & part.part
    add(enl_v_mat_extru_1_tool1.solids().sort_by_distance((-28.67, 0, 24.21))[0], mode=Mode.SUBTRACT)
    add(enl_v_mat_extru_1_tool2.solids().sort_by_distance((28.67, 0, 24.21))[0], mode=Mode.SUBTRACT)

    # Congé1
    cong_1_edges = [part.edges().sort_by_distance(p)[0] for p in [
        (-50.8, -2.38, 19.05),
        (-50.8, -2.38, -19.05),
        (50.8, -2.38, -19.05),
        (50.8, -2.38, 19.05),
        (-29.56, 20.24, 31.75),
        (-29.56, 20.24, 69.85),
        (29.56, 20.24, 69.85),
        (29.56, 20.24, 31.75),
    ]]
    fillet(cong_1_edges, radius=CONG_1_R)

    # Esquisse13 → Enlèv. mat.-Extru.3 (cut, through all)
    with BuildSketch(Plane(origin=(0, 0, 0), x_dir=(1, 0, 0), z_dir=(0, 1, 0))):
        with Locations(Location((-39.8145, 0, 0), (0, 0, 270))):
            Circle(ESQUISSE13_R)
        with Locations(Location((39.8145, 0, 0), (0, 0, 90))):
            Circle(ESQUISSE13_R)
    extrude(amount=-ENL_V_MAT_EXTRU_3_DEPTH, mode=Mode.SUBTRACT)

    # Diamètre du perçage Ø5.0 (5)1 (through all)
    with Locations(Plane(origin=(0, 0, 0), x_dir=(1, 0, 0), z_dir=(0, 1, 0))):
        with Locations((-12.7, 12.7), (0, 12.7), (12.7, 12.7)):
            diam_tre_du_per_age_5_0_5_1 = Hole(DIAM_TRE_DU_PER_AGE_5_0_5_1_D / 2)

    # Répétition linéaire1: Diamètre du perçage Ø5.0 (5)1 ×4
    with Locations(*[(0, 0, i * R_P_TITION_LIN_AIRE1_PITCH) for i in range(1, R_P_TITION_LIN_AIRE1_COUNT)]):
        add(diam_tre_du_per_age_5_0_5_1, mode=Mode.SUBTRACT)

    # Diamètre du perçage Ø5.0 (5)2
    with Locations(Plane.ZY.offset(31.94)):
        with Locations((50.06794197, 10.866778695), (38.47565905, -37.875384173)):
            Hole(DIAM_TRE_DU_PER_AGE_5_0_5_2_D / 2, depth=DIAM_TRE_DU_PER_AGE_5_0_5_2_DEPTH)

    # Diamètre du perçage Ø5.0 (5)3 (through all)
    with Locations(Plane(origin=(31.94, 0, 0), x_dir=(0, 0, -1), z_dir=(1, 0, 0))):
        with Locations((-50.06794197, 10.866778695)):
            Hole(DIAM_TRE_DU_PER_AGE_5_0_5_3_D / 2)


solid = part.part
